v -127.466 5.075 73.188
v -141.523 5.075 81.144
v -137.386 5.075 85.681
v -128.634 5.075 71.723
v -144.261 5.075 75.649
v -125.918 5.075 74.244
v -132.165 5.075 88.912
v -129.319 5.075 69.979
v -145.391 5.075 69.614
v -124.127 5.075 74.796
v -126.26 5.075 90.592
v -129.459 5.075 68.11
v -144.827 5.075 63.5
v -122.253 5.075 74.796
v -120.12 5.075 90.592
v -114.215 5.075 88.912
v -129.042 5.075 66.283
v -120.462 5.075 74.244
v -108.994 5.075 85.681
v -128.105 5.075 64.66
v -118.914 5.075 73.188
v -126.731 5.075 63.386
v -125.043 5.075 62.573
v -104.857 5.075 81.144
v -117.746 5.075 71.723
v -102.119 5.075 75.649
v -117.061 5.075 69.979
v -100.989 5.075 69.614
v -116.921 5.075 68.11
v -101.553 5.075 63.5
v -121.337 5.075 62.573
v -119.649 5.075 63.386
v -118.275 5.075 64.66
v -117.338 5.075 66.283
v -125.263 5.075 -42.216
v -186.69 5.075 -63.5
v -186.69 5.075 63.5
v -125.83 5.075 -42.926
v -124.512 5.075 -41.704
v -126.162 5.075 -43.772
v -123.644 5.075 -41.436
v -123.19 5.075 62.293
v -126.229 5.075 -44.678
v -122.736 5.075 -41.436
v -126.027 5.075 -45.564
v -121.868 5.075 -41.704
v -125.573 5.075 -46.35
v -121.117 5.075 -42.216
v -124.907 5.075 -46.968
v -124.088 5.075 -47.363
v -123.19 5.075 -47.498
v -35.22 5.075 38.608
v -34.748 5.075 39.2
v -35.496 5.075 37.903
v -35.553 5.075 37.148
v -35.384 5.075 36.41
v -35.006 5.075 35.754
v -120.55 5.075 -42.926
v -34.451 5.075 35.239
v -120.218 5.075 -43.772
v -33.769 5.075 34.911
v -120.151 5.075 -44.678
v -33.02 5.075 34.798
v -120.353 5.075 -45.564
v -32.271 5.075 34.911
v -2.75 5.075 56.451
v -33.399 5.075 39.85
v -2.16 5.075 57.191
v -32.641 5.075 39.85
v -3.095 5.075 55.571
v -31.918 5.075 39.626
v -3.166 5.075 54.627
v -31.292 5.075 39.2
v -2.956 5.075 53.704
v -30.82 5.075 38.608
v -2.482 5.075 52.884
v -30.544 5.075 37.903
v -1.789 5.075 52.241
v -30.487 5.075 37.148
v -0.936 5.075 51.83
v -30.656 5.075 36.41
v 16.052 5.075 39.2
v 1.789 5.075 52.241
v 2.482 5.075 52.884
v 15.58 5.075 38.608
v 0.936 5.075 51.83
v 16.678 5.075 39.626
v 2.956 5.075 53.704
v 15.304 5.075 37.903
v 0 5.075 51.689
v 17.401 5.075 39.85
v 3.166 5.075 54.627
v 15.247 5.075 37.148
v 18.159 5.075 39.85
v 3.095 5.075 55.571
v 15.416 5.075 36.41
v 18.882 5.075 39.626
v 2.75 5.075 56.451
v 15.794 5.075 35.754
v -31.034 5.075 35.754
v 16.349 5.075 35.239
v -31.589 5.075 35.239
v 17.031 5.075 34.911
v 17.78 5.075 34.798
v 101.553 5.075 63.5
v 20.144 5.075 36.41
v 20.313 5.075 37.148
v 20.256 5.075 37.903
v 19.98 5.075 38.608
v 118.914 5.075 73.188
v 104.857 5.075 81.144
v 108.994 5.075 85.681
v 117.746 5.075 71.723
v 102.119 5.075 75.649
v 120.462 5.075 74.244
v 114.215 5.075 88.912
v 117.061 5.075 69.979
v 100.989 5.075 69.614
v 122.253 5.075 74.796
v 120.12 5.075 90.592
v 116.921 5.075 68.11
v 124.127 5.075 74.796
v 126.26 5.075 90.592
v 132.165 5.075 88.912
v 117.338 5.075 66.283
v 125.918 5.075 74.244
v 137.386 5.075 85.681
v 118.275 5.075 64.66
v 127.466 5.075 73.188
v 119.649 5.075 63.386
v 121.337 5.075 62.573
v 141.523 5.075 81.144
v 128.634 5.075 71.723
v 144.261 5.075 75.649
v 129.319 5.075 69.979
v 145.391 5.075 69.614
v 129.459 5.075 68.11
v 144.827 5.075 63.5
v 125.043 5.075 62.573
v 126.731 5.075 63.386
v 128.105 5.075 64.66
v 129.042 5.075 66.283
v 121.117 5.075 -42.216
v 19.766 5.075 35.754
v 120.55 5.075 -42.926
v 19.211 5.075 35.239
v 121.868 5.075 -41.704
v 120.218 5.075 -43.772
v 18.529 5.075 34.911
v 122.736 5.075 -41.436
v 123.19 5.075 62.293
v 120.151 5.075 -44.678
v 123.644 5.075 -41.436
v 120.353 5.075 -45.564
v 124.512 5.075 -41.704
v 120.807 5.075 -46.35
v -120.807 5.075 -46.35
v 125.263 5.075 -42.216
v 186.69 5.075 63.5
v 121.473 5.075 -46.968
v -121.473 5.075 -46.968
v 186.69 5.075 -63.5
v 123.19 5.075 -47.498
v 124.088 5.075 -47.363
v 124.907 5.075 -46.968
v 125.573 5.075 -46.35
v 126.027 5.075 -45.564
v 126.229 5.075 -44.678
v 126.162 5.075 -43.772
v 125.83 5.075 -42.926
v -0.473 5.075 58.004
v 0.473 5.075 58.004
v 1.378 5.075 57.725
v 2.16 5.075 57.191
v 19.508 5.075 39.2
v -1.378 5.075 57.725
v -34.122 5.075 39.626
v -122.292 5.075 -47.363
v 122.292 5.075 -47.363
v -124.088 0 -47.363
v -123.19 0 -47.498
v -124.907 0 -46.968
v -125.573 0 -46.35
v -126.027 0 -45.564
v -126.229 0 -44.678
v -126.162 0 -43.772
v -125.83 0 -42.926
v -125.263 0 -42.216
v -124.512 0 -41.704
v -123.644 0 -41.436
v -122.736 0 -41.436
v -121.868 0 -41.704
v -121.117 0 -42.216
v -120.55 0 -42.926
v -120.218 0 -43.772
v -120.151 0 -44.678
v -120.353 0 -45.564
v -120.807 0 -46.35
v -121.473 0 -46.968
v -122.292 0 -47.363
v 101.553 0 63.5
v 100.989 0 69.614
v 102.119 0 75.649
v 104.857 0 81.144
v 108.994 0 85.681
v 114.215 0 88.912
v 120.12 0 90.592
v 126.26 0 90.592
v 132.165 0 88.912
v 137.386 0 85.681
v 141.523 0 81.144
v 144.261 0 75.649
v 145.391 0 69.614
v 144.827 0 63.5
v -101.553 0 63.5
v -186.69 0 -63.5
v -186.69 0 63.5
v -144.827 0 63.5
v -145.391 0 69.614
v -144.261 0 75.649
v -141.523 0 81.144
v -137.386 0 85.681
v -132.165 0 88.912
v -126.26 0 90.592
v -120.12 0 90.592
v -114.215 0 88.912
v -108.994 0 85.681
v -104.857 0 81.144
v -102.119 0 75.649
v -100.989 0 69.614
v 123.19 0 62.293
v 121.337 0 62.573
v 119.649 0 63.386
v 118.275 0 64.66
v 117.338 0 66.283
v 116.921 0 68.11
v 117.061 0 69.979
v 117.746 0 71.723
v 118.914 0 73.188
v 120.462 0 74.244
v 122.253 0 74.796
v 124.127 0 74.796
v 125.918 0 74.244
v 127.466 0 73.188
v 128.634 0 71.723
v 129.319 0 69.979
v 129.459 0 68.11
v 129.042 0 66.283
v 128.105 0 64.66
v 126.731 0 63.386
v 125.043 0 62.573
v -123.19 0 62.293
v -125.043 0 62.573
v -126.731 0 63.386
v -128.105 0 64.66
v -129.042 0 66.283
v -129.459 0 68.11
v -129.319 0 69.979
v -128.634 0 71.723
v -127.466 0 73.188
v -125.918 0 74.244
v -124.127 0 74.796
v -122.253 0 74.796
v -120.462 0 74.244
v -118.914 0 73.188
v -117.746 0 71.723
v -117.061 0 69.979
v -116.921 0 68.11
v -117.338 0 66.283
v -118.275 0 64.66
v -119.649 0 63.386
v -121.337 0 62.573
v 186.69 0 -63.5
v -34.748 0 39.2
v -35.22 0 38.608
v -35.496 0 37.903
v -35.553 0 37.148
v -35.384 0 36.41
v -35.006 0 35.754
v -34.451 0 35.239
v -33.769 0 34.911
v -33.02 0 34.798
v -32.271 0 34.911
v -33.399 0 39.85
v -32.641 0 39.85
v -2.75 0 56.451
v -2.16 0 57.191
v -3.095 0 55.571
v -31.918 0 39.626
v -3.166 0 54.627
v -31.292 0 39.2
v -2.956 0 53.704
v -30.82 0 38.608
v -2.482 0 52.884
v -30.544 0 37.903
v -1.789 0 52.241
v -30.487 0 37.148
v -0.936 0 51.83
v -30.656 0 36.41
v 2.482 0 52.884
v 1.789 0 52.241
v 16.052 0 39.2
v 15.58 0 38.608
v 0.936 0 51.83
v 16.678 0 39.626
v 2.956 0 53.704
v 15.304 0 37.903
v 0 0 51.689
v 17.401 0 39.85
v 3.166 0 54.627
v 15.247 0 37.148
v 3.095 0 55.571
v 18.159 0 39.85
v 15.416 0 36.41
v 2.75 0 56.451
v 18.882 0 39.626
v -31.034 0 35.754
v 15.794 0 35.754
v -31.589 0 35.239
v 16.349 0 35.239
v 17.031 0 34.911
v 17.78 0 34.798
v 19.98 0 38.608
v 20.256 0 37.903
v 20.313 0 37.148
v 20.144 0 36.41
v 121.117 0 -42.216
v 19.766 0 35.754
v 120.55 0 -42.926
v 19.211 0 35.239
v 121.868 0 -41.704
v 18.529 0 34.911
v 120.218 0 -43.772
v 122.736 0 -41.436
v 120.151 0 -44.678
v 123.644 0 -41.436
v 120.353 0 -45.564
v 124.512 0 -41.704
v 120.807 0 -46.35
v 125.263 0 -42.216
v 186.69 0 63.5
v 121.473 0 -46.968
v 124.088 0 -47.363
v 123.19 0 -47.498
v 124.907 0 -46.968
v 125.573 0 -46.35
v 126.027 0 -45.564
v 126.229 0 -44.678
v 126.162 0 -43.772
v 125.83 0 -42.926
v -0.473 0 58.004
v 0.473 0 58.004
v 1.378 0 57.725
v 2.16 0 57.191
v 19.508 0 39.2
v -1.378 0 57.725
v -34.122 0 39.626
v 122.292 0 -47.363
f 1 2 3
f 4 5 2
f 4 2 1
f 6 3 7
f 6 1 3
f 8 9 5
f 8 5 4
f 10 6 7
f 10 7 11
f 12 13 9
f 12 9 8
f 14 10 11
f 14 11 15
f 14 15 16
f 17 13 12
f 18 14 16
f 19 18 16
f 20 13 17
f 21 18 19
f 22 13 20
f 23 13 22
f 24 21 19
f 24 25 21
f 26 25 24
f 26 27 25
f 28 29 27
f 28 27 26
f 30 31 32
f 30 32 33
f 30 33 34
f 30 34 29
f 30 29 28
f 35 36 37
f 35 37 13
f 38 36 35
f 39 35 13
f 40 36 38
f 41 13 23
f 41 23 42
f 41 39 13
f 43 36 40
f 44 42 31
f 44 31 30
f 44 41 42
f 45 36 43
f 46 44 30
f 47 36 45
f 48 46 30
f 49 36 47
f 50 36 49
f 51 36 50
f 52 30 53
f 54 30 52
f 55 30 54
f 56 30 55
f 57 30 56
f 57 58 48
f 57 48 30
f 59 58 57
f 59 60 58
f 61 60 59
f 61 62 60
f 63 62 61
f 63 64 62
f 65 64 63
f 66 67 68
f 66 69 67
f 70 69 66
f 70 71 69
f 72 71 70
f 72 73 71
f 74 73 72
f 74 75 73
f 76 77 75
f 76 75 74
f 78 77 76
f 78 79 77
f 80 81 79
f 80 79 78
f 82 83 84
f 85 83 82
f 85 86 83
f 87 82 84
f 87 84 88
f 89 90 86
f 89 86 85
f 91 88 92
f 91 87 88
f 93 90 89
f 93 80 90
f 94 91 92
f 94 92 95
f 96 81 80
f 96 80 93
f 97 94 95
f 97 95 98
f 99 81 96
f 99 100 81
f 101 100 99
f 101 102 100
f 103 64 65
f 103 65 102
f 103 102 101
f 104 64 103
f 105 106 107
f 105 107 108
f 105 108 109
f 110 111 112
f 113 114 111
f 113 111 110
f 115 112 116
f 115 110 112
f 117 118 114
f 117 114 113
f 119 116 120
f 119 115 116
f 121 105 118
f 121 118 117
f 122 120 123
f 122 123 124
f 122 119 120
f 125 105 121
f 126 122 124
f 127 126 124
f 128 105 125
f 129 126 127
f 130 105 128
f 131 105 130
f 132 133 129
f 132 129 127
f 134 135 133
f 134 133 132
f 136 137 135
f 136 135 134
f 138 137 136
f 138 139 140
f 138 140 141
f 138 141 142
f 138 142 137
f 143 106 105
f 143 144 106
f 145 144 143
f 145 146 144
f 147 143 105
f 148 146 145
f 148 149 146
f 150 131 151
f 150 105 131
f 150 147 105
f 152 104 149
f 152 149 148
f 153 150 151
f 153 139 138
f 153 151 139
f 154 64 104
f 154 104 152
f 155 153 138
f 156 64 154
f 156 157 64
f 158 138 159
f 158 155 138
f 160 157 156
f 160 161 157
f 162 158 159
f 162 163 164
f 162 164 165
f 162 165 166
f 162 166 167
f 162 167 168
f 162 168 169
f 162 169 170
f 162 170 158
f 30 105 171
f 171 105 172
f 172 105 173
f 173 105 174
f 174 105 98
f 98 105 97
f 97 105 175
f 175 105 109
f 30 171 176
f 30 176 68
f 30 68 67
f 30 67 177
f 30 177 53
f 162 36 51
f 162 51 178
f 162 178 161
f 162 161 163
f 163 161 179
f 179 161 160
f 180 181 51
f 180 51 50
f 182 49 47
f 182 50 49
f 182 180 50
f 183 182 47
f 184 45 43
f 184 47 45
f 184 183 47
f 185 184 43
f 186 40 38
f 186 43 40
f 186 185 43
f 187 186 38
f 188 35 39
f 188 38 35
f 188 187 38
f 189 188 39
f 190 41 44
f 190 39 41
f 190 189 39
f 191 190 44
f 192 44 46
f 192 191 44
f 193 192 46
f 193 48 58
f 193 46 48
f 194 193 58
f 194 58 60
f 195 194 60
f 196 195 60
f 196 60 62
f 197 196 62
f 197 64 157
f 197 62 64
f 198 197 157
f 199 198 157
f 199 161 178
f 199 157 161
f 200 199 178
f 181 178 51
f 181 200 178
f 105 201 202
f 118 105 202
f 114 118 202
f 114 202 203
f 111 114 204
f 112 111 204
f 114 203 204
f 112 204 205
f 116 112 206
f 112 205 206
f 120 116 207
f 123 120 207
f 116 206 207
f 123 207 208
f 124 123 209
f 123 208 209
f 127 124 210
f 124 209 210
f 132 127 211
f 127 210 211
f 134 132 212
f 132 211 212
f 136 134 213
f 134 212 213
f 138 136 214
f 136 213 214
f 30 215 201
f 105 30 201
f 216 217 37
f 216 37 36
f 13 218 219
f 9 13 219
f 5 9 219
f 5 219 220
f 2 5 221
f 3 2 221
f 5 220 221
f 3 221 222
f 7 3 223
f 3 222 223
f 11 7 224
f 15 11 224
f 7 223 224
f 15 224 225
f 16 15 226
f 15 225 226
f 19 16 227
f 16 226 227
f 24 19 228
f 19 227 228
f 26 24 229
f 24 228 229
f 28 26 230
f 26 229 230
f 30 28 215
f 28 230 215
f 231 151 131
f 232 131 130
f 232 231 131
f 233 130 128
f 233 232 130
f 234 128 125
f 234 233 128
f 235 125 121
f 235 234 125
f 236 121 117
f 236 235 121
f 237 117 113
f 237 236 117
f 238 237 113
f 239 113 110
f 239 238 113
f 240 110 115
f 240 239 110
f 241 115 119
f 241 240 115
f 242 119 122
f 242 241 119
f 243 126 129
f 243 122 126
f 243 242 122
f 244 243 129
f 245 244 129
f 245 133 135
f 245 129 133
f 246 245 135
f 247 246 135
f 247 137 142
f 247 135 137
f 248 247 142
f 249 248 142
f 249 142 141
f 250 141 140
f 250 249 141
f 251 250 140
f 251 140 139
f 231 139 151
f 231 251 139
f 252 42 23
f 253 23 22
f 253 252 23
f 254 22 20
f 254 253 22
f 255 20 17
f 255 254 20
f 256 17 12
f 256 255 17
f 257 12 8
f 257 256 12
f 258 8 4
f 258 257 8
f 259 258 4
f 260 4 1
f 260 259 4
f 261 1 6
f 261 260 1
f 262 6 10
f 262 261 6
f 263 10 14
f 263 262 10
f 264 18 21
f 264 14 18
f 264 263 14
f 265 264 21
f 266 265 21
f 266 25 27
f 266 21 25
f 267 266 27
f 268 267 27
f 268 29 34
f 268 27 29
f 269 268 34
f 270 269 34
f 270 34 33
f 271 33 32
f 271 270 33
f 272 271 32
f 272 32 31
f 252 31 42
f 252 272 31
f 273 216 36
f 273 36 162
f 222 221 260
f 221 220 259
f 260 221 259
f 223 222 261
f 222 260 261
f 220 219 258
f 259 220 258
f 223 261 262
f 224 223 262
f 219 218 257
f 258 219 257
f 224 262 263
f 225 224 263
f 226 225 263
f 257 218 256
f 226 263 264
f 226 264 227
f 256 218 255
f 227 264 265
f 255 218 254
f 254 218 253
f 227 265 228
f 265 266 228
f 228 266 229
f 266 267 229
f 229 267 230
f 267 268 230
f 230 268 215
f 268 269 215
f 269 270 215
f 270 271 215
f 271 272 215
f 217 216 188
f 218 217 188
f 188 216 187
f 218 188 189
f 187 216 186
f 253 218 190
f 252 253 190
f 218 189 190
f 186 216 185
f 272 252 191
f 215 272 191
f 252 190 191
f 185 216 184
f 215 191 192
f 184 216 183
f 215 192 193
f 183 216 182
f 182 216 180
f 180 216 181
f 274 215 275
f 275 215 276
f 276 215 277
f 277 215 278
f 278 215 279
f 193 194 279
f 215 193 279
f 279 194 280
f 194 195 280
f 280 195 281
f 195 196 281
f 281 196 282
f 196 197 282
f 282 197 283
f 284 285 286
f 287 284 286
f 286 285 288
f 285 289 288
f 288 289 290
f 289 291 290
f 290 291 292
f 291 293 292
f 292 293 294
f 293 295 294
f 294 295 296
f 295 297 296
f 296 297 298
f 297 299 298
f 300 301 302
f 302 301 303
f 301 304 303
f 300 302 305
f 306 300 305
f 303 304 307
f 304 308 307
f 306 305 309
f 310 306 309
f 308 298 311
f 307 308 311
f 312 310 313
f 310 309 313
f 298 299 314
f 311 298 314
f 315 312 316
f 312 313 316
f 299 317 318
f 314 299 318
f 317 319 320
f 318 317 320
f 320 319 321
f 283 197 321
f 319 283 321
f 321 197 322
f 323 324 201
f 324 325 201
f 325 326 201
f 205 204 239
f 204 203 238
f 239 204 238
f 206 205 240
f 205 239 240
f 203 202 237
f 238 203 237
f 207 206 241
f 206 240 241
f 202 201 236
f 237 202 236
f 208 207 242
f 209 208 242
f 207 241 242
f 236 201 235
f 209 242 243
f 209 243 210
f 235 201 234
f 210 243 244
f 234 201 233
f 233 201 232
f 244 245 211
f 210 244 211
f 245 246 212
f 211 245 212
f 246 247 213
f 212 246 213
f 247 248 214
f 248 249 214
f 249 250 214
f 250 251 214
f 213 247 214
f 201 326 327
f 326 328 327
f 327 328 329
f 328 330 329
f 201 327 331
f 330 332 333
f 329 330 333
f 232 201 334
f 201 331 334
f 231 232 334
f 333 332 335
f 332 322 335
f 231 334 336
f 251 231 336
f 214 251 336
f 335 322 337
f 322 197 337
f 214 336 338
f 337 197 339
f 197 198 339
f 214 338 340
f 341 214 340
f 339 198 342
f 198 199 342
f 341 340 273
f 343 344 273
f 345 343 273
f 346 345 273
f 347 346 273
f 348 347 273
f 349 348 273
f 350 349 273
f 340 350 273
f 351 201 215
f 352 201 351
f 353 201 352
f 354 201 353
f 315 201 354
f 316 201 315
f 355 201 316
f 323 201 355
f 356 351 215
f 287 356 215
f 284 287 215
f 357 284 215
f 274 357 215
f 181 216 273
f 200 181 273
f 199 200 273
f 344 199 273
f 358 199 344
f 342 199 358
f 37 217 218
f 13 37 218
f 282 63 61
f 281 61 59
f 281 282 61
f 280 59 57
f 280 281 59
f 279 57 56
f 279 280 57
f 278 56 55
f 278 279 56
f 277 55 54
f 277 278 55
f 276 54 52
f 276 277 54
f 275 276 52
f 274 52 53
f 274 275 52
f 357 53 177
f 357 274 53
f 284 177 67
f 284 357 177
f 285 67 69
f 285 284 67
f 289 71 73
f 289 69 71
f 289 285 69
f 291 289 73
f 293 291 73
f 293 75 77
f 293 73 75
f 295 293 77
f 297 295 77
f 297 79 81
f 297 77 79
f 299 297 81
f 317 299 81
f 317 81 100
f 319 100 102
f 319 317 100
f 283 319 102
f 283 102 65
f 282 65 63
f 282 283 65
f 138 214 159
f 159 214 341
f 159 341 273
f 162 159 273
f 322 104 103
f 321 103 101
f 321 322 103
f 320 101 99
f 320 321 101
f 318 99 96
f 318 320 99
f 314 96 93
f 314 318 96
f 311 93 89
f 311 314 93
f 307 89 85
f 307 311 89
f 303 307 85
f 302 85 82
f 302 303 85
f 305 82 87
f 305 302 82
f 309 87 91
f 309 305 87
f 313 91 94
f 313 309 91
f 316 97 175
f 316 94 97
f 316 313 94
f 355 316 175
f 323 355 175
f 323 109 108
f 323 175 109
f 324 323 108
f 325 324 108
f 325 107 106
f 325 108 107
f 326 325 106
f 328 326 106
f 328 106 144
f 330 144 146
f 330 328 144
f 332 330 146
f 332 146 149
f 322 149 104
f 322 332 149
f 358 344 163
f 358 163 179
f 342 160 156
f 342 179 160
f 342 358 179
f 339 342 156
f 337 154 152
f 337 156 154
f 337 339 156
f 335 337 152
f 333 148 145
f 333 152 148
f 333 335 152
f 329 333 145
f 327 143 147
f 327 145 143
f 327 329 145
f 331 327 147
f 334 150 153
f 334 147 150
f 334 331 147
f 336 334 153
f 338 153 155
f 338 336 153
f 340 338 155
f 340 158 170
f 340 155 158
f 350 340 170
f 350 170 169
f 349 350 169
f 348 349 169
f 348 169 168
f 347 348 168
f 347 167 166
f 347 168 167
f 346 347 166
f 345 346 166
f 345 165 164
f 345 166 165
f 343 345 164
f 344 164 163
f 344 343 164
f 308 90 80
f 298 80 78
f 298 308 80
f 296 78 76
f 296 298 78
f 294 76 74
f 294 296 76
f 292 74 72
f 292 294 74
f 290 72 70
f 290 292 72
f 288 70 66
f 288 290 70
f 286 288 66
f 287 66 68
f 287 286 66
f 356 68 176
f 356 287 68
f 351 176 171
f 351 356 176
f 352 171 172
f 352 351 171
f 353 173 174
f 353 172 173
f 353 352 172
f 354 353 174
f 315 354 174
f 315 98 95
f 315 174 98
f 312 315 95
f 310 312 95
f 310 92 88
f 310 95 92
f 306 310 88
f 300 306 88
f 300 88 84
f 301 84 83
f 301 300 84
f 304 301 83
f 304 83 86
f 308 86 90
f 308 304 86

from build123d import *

# Parameters (mm, degrees)
SKETCH1_R               = 22.225
SKETCH1_W               = 373.38
SKETCH1_H               = 127
BOSS_EXTRUDE1_DEPTH     = 5.07492
SKETCH1_5_R             = 6.2865
CUT_EXTRUDE1_DEPTH      = 208.664293845
CUT_EXTRUDE2_DEPTH      = 208.664293845
CUT_EXTRUDE2_DEPTH_BACK = 208.664293845
SKETCH1_7_R             = 3.048
SKETCH1_8_R             = 2.54
SKETCH1_8_R_2           = 3.175
CUT_EXTRUDE3_DEPTH      = 208.664293845


with BuildPart() as part:
    # Sketch1 → Boss-Extrude1 (new body)
    with BuildSketch(Plane(origin=(0, 0, 0), x_dir=(1, 0, 0), z_dir=(0, 1, 0))):
        with Locations((-123.19, -68.58)):
            Circle(SKETCH1_R)
        with Locations((123.19, -68.58)):
            Circle(SKETCH1_R)
        Rectangle(SKETCH1_W, SKETCH1_H)
    extrude(amount=BOSS_EXTRUDE1_DEPTH)

    # Sketch1<5> → Cut-Extrude1 (cut, through all)
    with BuildSketch(Plane(origin=(0, 0, 0), x_dir=(1, 0, 0), z_dir=(0, 1, 0))):
        with Locations(Location((-123.19, -68.58, 0), (0, 0, 90))):
            Circle(SKETCH1_5_R)
        with Locations(Location((123.19, -68.58, 0), (0, 0, 90))):
            Circle(SKETCH1_5_R)
    extrude(amount=CUT_EXTRUDE1_DEPTH, mode=Mode.SUBTRACT)

    # Sketch1<7> → Cut-Extrude2 (cut, two sides: drawn at the far end of the back side and taken through both)
    with BuildSketch(Plane(origin=(0, 0, 0), x_dir=(1, 0, 0), z_dir=(0, 1, 0)).offset(-CUT_EXTRUDE2_DEPTH_BACK)):
        with Locations(Location((-123.19, 44.45, 0), (0, 0, 90))):
            Circle(SKETCH1_7_R)
        with Locations(Location((123.19, 44.45, 0), (0, 0, 90))):
            Circle(SKETCH1_7_R)
    extrude(amount=CUT_EXTRUDE2_DEPTH + CUT_EXTRUDE2_DEPTH_BACK, mode=Mode.SUBTRACT)

    # Sketch1<8> → Cut-Extrude3 (cut, through all)
    with BuildSketch(Plane(origin=(0, 0, 0), x_dir=(1, 0, 0), z_dir=(0, 1, 0))):
        with Locations(Location((-33.02, -37.338, 0), (0, 0, 90))):
            Circle(SKETCH1_8_R)
        with Locations(Location((17.78, -37.338, 0), (0, 0, 90))):
            Circle(SKETCH1_8_R)
        with Locations(Location((0, -54.864, 0), (0, 0, 90))):
            Circle(SKETCH1_8_R_2)
    extrude(amount=CUT_EXTRUDE3_DEPTH, mode=Mode.SUBTRACT)


solid = part.part
